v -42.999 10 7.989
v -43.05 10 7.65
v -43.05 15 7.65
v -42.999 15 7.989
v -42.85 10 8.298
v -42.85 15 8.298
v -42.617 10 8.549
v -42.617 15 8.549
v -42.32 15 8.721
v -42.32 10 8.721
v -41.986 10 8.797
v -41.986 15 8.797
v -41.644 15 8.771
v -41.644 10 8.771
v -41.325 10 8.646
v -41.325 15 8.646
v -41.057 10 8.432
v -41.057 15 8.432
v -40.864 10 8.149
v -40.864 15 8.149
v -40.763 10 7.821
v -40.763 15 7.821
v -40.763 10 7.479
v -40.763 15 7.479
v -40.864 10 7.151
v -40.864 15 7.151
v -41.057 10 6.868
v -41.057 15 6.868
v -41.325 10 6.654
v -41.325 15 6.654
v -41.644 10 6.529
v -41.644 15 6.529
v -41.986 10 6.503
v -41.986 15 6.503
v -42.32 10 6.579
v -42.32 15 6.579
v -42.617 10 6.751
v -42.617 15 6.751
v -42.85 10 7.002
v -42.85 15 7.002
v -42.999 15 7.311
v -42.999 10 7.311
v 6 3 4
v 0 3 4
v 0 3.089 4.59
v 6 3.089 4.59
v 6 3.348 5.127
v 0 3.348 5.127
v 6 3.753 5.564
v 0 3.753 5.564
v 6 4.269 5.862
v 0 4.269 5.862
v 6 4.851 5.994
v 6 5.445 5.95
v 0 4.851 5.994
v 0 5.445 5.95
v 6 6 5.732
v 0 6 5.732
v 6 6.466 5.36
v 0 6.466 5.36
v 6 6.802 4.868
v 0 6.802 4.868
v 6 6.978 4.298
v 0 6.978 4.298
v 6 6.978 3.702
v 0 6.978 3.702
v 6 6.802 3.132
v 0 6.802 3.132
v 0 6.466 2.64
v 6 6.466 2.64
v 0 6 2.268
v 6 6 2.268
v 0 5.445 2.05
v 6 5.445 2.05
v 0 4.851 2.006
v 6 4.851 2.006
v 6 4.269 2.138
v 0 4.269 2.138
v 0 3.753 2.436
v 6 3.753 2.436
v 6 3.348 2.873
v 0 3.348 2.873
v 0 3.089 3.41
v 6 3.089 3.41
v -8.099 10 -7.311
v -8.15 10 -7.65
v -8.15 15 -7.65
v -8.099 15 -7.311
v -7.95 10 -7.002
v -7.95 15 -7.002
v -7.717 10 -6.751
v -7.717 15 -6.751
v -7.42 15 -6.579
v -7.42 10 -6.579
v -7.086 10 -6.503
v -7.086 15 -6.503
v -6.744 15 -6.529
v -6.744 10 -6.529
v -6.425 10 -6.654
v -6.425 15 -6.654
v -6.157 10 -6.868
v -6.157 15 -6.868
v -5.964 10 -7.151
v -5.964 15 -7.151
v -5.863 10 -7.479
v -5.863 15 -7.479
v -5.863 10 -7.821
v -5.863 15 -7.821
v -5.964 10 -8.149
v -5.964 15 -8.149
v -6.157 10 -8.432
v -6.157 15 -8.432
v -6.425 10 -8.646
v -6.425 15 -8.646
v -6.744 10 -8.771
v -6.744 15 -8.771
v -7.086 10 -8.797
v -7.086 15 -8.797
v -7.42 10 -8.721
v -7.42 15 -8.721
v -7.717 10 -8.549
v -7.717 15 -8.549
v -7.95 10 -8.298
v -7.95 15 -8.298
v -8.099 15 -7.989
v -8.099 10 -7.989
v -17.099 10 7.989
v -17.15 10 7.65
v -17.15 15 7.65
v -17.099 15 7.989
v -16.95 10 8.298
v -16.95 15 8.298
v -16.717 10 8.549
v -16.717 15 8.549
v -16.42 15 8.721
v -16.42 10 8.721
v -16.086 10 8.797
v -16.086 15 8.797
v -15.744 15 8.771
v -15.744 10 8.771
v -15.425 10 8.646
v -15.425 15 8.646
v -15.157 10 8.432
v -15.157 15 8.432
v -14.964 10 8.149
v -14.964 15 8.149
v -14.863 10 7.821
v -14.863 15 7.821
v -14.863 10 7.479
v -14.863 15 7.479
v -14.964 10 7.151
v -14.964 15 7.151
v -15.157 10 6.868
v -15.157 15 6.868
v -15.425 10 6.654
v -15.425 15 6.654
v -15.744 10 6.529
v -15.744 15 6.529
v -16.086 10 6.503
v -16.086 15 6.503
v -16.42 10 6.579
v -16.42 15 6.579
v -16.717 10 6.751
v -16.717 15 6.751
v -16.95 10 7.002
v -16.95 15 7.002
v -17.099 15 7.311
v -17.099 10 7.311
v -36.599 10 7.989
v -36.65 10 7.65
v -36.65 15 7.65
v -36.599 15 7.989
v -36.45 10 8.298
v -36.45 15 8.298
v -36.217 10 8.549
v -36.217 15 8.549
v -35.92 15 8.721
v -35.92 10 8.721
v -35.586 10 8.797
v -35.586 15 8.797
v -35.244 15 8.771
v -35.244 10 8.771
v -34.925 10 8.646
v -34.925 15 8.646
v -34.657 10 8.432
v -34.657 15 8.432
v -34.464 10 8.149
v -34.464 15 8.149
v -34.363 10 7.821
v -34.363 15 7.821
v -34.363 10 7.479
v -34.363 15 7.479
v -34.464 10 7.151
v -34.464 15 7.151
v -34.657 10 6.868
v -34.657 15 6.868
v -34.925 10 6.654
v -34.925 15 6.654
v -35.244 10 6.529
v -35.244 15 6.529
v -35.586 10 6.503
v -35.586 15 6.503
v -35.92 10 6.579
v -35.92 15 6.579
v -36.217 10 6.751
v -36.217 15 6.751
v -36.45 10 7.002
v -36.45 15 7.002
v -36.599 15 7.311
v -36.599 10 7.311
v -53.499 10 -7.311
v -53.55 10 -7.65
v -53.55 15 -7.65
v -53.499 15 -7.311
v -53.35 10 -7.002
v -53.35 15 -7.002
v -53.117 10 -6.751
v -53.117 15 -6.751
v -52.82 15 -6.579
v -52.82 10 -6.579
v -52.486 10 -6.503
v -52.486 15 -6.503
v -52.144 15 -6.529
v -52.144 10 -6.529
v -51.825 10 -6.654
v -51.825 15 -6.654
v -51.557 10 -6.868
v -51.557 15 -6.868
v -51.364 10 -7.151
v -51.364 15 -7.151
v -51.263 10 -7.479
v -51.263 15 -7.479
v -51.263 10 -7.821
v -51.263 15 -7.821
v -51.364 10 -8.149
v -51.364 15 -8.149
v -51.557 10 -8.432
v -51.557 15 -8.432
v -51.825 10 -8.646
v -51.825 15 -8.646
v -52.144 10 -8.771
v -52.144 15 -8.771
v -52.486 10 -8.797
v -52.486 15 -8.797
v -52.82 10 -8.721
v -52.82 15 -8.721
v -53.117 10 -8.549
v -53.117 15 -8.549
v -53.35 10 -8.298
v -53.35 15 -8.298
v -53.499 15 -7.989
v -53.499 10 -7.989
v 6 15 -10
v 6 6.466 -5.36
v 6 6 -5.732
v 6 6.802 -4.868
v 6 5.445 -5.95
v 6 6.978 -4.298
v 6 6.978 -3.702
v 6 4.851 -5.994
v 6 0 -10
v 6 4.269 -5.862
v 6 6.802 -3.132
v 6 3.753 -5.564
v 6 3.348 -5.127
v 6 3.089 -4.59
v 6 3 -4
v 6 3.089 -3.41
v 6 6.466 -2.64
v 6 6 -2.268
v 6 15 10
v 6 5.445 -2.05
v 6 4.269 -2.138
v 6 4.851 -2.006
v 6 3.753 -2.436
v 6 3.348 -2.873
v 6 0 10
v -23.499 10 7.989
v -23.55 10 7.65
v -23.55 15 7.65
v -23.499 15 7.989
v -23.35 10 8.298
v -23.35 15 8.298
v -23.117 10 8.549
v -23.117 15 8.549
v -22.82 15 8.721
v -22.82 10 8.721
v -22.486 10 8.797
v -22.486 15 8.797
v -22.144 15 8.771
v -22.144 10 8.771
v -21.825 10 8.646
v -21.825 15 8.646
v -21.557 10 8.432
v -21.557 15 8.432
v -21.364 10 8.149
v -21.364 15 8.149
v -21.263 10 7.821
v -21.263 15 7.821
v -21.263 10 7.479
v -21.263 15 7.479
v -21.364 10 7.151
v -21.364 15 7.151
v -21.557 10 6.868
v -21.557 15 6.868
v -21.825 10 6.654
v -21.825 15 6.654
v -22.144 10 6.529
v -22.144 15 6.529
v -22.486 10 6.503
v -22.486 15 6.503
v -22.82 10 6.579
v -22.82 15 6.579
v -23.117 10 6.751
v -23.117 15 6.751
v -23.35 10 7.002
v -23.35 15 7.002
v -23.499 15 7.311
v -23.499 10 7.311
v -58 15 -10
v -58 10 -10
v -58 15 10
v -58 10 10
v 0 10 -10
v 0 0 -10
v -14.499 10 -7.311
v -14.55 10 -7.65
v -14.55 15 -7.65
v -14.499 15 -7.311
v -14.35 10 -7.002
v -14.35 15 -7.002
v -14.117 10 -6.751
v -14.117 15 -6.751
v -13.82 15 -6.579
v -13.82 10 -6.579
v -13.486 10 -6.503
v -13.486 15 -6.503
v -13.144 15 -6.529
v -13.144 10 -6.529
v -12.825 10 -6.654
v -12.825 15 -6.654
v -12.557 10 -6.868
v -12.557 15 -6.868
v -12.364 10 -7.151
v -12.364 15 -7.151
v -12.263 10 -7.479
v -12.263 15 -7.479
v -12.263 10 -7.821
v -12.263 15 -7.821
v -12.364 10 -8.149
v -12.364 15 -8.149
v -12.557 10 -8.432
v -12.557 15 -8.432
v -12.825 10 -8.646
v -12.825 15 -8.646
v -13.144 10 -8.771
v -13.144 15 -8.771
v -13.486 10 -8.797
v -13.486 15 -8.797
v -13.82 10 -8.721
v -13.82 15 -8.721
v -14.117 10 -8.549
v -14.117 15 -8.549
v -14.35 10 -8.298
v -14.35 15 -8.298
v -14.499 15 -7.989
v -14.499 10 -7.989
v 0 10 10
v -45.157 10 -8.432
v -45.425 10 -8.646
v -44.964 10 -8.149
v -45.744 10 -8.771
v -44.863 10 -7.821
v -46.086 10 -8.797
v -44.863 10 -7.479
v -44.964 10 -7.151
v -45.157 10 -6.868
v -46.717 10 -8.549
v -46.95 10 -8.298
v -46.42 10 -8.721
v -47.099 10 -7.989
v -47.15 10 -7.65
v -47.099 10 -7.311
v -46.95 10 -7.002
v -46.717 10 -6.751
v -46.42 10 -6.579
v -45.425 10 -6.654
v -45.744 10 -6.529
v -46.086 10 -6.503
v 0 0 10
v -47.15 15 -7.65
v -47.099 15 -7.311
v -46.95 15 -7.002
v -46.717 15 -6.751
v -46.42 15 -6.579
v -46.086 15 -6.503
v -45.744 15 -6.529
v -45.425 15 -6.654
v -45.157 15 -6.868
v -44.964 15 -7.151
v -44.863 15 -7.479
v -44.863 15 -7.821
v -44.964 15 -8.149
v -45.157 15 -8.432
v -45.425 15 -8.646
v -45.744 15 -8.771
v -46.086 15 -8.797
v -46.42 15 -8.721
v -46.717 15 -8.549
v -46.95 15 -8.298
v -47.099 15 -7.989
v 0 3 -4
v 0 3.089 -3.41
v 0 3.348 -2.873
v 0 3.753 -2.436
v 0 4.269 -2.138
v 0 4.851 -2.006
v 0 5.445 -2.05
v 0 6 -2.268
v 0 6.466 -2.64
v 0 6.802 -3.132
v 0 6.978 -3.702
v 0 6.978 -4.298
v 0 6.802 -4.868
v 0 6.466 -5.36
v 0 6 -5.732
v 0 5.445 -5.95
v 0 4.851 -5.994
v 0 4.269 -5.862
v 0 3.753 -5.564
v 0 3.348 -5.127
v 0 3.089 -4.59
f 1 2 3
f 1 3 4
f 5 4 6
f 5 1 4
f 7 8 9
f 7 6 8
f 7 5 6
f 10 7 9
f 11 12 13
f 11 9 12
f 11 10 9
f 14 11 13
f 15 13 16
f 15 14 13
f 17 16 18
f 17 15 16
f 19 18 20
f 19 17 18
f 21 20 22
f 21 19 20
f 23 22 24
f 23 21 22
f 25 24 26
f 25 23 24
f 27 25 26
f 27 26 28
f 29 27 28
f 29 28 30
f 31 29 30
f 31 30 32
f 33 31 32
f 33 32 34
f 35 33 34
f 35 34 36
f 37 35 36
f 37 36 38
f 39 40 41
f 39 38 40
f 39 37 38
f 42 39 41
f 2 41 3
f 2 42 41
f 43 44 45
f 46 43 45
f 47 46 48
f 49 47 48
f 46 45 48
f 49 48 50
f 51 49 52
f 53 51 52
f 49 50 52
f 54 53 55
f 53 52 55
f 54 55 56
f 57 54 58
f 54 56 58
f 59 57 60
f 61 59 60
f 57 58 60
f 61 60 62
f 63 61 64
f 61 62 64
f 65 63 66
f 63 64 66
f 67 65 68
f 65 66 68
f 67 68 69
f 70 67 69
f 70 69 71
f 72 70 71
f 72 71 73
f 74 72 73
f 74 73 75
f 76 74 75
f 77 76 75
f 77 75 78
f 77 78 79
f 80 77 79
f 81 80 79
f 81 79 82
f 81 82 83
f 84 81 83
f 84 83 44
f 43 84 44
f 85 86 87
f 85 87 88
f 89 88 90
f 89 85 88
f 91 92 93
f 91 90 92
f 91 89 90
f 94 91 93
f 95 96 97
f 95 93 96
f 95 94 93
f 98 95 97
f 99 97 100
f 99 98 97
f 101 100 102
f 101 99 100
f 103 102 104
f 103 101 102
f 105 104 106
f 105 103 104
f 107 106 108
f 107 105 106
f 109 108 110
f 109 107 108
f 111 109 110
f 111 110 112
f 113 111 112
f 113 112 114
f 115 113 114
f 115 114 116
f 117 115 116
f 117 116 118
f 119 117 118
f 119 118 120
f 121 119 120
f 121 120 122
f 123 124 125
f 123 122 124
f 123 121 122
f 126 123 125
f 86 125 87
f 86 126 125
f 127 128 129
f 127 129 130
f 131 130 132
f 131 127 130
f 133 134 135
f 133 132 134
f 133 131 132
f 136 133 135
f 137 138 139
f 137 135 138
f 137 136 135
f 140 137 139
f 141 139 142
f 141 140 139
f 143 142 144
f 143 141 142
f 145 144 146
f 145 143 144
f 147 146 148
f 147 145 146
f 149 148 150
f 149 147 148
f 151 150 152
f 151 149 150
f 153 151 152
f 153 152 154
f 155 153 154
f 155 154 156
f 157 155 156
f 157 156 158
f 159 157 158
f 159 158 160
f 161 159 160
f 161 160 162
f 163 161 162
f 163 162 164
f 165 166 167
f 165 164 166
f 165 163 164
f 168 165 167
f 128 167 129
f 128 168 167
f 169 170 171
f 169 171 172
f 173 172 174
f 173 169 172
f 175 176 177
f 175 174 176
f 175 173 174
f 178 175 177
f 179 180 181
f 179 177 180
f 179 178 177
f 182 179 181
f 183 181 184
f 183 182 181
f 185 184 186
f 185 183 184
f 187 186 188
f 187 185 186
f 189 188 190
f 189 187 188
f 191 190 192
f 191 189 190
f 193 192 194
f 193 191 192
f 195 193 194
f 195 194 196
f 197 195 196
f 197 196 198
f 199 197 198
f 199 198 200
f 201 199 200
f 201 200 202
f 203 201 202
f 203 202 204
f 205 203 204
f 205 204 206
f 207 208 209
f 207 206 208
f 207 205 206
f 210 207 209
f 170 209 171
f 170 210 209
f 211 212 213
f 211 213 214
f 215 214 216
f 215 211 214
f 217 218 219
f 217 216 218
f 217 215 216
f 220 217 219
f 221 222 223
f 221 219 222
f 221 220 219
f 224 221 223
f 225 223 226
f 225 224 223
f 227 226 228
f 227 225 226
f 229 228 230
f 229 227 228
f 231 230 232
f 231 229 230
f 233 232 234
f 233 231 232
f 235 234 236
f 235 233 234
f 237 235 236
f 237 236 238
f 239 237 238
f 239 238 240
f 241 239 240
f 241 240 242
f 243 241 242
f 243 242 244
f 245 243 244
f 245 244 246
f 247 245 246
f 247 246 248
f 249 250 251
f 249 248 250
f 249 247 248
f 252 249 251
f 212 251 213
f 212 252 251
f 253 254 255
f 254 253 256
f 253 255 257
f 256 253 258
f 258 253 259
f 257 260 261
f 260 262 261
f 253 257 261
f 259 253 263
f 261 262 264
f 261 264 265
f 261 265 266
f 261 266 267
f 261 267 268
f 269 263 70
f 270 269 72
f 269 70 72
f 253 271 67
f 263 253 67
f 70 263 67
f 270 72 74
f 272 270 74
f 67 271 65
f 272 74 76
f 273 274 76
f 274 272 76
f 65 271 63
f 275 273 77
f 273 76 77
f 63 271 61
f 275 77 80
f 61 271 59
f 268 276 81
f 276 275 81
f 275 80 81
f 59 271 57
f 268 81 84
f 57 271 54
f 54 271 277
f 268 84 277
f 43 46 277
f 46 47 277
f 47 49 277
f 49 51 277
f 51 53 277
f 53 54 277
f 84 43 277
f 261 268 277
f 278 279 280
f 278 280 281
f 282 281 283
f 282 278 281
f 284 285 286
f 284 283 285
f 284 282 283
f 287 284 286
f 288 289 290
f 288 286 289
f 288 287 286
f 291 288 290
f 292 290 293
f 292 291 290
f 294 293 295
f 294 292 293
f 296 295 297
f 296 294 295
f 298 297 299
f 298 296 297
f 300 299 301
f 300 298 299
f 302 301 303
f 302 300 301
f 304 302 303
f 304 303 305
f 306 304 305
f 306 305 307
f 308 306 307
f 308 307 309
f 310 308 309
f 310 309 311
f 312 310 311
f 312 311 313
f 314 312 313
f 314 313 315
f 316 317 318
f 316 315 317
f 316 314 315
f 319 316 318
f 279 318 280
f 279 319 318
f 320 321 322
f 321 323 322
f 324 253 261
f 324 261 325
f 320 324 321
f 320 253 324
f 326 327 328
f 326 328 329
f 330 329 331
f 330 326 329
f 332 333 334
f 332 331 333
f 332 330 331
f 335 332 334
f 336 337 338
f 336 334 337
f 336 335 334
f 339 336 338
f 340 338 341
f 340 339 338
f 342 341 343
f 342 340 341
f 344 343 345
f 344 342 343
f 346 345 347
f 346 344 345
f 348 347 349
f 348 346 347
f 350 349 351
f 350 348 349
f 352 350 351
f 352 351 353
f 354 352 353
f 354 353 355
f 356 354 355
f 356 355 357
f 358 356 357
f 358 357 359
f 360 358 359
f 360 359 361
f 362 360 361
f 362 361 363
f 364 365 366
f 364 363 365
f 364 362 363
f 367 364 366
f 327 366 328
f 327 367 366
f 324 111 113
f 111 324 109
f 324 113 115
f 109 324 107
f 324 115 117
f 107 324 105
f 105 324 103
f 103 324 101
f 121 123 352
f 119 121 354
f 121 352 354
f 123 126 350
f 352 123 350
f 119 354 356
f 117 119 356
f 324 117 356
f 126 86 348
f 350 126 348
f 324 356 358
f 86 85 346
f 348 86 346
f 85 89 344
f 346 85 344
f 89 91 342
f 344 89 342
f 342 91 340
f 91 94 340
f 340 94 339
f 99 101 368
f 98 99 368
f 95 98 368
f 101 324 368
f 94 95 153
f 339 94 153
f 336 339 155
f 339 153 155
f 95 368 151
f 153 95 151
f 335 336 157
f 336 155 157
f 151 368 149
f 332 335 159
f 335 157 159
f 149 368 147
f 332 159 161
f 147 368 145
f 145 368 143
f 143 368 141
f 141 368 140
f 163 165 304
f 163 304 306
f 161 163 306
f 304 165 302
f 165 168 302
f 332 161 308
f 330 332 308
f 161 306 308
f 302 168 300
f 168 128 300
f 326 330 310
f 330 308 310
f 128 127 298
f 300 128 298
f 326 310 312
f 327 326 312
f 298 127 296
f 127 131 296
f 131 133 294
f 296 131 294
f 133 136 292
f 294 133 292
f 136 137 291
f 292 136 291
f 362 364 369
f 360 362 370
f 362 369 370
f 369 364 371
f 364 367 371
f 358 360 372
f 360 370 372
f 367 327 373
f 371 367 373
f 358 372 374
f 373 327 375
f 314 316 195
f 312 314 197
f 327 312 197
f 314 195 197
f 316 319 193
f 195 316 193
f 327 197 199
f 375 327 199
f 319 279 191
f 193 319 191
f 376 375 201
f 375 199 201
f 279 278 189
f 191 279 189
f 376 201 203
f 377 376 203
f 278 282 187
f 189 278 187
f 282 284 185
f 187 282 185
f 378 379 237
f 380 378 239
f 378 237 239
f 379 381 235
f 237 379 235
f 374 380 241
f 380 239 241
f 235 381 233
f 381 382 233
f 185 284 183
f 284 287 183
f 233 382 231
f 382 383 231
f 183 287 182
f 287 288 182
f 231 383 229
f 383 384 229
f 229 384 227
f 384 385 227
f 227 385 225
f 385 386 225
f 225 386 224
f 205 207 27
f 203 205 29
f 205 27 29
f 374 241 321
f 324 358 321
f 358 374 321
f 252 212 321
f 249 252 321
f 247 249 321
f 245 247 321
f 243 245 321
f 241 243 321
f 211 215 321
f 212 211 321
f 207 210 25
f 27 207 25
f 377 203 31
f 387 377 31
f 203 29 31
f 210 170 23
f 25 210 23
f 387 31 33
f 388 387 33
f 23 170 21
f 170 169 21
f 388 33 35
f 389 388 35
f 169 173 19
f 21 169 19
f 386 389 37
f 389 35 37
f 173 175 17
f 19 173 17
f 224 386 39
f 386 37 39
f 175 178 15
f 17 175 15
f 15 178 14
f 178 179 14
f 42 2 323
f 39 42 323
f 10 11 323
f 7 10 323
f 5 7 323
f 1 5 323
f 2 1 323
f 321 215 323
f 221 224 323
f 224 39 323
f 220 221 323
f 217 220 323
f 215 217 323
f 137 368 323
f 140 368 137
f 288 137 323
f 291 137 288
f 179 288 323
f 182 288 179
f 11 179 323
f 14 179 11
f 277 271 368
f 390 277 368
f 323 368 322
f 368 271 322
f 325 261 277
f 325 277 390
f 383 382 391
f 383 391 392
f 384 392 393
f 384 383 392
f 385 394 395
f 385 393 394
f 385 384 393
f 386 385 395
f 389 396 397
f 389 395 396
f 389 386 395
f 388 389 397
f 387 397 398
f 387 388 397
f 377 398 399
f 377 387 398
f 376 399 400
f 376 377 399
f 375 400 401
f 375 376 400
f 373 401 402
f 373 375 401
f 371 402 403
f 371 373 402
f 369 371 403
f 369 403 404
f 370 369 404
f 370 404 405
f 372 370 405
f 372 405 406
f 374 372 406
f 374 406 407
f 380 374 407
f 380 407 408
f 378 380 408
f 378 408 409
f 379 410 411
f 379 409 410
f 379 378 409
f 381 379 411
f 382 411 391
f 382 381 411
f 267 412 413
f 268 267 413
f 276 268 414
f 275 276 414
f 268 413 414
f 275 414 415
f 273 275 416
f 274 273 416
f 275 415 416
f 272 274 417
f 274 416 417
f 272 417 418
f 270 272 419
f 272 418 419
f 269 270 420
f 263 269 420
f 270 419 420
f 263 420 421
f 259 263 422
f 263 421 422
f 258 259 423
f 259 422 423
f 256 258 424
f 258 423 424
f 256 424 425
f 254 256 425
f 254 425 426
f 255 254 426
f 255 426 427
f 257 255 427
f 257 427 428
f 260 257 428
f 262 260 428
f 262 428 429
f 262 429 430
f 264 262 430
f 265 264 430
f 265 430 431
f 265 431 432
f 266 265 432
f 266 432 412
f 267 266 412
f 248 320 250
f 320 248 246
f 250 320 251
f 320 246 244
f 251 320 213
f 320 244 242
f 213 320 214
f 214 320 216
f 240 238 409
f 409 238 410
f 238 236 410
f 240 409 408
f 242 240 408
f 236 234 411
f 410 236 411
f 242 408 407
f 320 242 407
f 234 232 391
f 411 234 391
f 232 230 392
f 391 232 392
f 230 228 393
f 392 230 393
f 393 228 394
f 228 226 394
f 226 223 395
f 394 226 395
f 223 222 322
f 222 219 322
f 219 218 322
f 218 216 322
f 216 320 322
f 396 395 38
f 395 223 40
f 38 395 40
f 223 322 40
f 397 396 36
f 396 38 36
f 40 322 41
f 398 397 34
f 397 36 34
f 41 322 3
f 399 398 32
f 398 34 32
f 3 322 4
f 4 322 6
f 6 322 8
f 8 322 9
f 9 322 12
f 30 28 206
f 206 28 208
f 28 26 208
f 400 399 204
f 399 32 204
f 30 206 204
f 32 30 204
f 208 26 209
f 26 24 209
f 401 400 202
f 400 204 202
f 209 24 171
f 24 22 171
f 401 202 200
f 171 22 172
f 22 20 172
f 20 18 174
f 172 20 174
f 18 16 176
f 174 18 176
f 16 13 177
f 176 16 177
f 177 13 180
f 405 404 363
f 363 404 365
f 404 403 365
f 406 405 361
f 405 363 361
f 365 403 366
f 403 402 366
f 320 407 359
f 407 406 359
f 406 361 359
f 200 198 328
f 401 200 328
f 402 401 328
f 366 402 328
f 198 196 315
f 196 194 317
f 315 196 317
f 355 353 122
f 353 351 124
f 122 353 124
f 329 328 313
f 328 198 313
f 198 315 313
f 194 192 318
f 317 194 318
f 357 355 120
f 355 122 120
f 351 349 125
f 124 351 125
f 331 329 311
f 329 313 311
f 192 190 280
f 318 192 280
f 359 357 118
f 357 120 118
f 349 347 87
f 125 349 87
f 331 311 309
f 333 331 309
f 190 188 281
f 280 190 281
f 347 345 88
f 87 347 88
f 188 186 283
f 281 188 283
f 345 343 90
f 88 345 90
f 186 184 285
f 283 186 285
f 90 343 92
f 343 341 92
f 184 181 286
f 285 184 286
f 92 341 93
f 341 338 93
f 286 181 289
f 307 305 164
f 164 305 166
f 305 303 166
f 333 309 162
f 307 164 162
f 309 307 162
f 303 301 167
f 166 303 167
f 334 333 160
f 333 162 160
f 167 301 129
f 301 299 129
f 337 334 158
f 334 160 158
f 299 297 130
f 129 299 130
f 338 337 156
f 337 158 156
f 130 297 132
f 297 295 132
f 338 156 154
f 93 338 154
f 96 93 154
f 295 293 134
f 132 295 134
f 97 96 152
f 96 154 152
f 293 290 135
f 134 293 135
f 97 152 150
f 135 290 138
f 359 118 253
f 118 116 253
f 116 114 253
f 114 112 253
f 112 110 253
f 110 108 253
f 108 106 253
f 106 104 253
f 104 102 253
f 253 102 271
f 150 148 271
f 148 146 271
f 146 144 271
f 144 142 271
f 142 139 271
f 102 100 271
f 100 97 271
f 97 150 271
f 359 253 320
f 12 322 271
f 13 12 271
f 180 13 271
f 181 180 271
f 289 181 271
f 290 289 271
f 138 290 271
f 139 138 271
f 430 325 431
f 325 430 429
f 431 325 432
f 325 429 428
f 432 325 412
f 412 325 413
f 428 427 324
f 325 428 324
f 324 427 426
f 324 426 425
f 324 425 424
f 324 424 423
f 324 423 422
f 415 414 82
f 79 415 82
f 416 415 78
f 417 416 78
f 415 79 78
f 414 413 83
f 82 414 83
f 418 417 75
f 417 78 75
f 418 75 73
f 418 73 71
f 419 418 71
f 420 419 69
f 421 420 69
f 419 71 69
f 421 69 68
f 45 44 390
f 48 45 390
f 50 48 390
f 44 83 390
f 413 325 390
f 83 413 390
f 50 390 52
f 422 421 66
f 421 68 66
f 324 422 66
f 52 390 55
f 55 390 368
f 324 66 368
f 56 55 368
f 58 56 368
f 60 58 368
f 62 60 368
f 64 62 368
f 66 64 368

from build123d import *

# Parameters (mm, degrees)
RESSALTO_EXTRUS_O1_DEPTH   = 10
ESBO_O2_R                  = 2
CORTE_EXTRUS_O1_DEPTH      = 8
CORTE_EXTRUS_O2_DEPTH      = 61.737138556
CORTE_EXTRUS_O2_DEPTH_BACK = 61.737138556
ESBO_O3_R                  = 1.15


with BuildPart() as part:
    # Esboço1 → Ressalto-extrusão1 (new, symmetric)
    with BuildSketch(Plane.XY):
        Polygon((0, 0), (0, 10), (-58, 10), (-58, 15), (6, 15), (6, 0), align=None)
    extrude(amount=RESSALTO_EXTRUS_O1_DEPTH, both=True)

    # Esboço2 → Corte-extrusão1 (cut)
    with BuildSketch(Plane.ZY):
        with Locations(Location((-4, 5, 0), (0, 0, 270))):
            Circle(ESBO_O2_R)
        with Locations(Location((4, 5, 0), (0, 0, 270))):
            Circle(ESBO_O2_R)
    extrude(amount=-CORTE_EXTRUS_O1_DEPTH, mode=Mode.SUBTRACT)

    # Esboço3 → Corte-extrusão2 (cut, two sides: drawn at the far end of the back side and taken through both)
    with BuildSketch(Plane(origin=(0, 15, 0), x_dir=(1, 0, 0), z_dir=(0, 1, 0)).offset(-CORTE_EXTRUS_O2_DEPTH_BACK)):
        with Locations(Location((-16, -7.65, 0), (0, 0, 180))):
            Circle(ESBO_O3_R)
        with Locations(Location((-22.4, -7.65, 0), (0, 0, 180))):
            Circle(ESBO_O3_R)
        with Locations(Location((-35.5, -7.65, 0), (0, 0, 180))):
            Circle(ESBO_O3_R)
        with Locations(Location((-41.9, -7.65, 0), (0, 0, 180))):
            Circle(ESBO_O3_R)
        with Locations(Location((-46, 7.65, 0), (0, 0, 180))):
            Circle(ESBO_O3_R)
        with Locations(Location((-52.4, 7.65, 0), (0, 0, 180))):
            Circle(ESBO_O3_R)
        with Locations(Location((-13.4, 7.65, 0), (0, 0, 180))):
            Circle(ESBO_O3_R)
        with Locations(Location((-7, 7.65, 0), (0, 0, 180))):
            Circle(ESBO_O3_R)
    extrude(amount=CORTE_EXTRUS_O2_DEPTH + CORTE_EXTRUS_O2_DEPTH_BACK, mode=Mode.SUBTRACT)


solid = part.part
